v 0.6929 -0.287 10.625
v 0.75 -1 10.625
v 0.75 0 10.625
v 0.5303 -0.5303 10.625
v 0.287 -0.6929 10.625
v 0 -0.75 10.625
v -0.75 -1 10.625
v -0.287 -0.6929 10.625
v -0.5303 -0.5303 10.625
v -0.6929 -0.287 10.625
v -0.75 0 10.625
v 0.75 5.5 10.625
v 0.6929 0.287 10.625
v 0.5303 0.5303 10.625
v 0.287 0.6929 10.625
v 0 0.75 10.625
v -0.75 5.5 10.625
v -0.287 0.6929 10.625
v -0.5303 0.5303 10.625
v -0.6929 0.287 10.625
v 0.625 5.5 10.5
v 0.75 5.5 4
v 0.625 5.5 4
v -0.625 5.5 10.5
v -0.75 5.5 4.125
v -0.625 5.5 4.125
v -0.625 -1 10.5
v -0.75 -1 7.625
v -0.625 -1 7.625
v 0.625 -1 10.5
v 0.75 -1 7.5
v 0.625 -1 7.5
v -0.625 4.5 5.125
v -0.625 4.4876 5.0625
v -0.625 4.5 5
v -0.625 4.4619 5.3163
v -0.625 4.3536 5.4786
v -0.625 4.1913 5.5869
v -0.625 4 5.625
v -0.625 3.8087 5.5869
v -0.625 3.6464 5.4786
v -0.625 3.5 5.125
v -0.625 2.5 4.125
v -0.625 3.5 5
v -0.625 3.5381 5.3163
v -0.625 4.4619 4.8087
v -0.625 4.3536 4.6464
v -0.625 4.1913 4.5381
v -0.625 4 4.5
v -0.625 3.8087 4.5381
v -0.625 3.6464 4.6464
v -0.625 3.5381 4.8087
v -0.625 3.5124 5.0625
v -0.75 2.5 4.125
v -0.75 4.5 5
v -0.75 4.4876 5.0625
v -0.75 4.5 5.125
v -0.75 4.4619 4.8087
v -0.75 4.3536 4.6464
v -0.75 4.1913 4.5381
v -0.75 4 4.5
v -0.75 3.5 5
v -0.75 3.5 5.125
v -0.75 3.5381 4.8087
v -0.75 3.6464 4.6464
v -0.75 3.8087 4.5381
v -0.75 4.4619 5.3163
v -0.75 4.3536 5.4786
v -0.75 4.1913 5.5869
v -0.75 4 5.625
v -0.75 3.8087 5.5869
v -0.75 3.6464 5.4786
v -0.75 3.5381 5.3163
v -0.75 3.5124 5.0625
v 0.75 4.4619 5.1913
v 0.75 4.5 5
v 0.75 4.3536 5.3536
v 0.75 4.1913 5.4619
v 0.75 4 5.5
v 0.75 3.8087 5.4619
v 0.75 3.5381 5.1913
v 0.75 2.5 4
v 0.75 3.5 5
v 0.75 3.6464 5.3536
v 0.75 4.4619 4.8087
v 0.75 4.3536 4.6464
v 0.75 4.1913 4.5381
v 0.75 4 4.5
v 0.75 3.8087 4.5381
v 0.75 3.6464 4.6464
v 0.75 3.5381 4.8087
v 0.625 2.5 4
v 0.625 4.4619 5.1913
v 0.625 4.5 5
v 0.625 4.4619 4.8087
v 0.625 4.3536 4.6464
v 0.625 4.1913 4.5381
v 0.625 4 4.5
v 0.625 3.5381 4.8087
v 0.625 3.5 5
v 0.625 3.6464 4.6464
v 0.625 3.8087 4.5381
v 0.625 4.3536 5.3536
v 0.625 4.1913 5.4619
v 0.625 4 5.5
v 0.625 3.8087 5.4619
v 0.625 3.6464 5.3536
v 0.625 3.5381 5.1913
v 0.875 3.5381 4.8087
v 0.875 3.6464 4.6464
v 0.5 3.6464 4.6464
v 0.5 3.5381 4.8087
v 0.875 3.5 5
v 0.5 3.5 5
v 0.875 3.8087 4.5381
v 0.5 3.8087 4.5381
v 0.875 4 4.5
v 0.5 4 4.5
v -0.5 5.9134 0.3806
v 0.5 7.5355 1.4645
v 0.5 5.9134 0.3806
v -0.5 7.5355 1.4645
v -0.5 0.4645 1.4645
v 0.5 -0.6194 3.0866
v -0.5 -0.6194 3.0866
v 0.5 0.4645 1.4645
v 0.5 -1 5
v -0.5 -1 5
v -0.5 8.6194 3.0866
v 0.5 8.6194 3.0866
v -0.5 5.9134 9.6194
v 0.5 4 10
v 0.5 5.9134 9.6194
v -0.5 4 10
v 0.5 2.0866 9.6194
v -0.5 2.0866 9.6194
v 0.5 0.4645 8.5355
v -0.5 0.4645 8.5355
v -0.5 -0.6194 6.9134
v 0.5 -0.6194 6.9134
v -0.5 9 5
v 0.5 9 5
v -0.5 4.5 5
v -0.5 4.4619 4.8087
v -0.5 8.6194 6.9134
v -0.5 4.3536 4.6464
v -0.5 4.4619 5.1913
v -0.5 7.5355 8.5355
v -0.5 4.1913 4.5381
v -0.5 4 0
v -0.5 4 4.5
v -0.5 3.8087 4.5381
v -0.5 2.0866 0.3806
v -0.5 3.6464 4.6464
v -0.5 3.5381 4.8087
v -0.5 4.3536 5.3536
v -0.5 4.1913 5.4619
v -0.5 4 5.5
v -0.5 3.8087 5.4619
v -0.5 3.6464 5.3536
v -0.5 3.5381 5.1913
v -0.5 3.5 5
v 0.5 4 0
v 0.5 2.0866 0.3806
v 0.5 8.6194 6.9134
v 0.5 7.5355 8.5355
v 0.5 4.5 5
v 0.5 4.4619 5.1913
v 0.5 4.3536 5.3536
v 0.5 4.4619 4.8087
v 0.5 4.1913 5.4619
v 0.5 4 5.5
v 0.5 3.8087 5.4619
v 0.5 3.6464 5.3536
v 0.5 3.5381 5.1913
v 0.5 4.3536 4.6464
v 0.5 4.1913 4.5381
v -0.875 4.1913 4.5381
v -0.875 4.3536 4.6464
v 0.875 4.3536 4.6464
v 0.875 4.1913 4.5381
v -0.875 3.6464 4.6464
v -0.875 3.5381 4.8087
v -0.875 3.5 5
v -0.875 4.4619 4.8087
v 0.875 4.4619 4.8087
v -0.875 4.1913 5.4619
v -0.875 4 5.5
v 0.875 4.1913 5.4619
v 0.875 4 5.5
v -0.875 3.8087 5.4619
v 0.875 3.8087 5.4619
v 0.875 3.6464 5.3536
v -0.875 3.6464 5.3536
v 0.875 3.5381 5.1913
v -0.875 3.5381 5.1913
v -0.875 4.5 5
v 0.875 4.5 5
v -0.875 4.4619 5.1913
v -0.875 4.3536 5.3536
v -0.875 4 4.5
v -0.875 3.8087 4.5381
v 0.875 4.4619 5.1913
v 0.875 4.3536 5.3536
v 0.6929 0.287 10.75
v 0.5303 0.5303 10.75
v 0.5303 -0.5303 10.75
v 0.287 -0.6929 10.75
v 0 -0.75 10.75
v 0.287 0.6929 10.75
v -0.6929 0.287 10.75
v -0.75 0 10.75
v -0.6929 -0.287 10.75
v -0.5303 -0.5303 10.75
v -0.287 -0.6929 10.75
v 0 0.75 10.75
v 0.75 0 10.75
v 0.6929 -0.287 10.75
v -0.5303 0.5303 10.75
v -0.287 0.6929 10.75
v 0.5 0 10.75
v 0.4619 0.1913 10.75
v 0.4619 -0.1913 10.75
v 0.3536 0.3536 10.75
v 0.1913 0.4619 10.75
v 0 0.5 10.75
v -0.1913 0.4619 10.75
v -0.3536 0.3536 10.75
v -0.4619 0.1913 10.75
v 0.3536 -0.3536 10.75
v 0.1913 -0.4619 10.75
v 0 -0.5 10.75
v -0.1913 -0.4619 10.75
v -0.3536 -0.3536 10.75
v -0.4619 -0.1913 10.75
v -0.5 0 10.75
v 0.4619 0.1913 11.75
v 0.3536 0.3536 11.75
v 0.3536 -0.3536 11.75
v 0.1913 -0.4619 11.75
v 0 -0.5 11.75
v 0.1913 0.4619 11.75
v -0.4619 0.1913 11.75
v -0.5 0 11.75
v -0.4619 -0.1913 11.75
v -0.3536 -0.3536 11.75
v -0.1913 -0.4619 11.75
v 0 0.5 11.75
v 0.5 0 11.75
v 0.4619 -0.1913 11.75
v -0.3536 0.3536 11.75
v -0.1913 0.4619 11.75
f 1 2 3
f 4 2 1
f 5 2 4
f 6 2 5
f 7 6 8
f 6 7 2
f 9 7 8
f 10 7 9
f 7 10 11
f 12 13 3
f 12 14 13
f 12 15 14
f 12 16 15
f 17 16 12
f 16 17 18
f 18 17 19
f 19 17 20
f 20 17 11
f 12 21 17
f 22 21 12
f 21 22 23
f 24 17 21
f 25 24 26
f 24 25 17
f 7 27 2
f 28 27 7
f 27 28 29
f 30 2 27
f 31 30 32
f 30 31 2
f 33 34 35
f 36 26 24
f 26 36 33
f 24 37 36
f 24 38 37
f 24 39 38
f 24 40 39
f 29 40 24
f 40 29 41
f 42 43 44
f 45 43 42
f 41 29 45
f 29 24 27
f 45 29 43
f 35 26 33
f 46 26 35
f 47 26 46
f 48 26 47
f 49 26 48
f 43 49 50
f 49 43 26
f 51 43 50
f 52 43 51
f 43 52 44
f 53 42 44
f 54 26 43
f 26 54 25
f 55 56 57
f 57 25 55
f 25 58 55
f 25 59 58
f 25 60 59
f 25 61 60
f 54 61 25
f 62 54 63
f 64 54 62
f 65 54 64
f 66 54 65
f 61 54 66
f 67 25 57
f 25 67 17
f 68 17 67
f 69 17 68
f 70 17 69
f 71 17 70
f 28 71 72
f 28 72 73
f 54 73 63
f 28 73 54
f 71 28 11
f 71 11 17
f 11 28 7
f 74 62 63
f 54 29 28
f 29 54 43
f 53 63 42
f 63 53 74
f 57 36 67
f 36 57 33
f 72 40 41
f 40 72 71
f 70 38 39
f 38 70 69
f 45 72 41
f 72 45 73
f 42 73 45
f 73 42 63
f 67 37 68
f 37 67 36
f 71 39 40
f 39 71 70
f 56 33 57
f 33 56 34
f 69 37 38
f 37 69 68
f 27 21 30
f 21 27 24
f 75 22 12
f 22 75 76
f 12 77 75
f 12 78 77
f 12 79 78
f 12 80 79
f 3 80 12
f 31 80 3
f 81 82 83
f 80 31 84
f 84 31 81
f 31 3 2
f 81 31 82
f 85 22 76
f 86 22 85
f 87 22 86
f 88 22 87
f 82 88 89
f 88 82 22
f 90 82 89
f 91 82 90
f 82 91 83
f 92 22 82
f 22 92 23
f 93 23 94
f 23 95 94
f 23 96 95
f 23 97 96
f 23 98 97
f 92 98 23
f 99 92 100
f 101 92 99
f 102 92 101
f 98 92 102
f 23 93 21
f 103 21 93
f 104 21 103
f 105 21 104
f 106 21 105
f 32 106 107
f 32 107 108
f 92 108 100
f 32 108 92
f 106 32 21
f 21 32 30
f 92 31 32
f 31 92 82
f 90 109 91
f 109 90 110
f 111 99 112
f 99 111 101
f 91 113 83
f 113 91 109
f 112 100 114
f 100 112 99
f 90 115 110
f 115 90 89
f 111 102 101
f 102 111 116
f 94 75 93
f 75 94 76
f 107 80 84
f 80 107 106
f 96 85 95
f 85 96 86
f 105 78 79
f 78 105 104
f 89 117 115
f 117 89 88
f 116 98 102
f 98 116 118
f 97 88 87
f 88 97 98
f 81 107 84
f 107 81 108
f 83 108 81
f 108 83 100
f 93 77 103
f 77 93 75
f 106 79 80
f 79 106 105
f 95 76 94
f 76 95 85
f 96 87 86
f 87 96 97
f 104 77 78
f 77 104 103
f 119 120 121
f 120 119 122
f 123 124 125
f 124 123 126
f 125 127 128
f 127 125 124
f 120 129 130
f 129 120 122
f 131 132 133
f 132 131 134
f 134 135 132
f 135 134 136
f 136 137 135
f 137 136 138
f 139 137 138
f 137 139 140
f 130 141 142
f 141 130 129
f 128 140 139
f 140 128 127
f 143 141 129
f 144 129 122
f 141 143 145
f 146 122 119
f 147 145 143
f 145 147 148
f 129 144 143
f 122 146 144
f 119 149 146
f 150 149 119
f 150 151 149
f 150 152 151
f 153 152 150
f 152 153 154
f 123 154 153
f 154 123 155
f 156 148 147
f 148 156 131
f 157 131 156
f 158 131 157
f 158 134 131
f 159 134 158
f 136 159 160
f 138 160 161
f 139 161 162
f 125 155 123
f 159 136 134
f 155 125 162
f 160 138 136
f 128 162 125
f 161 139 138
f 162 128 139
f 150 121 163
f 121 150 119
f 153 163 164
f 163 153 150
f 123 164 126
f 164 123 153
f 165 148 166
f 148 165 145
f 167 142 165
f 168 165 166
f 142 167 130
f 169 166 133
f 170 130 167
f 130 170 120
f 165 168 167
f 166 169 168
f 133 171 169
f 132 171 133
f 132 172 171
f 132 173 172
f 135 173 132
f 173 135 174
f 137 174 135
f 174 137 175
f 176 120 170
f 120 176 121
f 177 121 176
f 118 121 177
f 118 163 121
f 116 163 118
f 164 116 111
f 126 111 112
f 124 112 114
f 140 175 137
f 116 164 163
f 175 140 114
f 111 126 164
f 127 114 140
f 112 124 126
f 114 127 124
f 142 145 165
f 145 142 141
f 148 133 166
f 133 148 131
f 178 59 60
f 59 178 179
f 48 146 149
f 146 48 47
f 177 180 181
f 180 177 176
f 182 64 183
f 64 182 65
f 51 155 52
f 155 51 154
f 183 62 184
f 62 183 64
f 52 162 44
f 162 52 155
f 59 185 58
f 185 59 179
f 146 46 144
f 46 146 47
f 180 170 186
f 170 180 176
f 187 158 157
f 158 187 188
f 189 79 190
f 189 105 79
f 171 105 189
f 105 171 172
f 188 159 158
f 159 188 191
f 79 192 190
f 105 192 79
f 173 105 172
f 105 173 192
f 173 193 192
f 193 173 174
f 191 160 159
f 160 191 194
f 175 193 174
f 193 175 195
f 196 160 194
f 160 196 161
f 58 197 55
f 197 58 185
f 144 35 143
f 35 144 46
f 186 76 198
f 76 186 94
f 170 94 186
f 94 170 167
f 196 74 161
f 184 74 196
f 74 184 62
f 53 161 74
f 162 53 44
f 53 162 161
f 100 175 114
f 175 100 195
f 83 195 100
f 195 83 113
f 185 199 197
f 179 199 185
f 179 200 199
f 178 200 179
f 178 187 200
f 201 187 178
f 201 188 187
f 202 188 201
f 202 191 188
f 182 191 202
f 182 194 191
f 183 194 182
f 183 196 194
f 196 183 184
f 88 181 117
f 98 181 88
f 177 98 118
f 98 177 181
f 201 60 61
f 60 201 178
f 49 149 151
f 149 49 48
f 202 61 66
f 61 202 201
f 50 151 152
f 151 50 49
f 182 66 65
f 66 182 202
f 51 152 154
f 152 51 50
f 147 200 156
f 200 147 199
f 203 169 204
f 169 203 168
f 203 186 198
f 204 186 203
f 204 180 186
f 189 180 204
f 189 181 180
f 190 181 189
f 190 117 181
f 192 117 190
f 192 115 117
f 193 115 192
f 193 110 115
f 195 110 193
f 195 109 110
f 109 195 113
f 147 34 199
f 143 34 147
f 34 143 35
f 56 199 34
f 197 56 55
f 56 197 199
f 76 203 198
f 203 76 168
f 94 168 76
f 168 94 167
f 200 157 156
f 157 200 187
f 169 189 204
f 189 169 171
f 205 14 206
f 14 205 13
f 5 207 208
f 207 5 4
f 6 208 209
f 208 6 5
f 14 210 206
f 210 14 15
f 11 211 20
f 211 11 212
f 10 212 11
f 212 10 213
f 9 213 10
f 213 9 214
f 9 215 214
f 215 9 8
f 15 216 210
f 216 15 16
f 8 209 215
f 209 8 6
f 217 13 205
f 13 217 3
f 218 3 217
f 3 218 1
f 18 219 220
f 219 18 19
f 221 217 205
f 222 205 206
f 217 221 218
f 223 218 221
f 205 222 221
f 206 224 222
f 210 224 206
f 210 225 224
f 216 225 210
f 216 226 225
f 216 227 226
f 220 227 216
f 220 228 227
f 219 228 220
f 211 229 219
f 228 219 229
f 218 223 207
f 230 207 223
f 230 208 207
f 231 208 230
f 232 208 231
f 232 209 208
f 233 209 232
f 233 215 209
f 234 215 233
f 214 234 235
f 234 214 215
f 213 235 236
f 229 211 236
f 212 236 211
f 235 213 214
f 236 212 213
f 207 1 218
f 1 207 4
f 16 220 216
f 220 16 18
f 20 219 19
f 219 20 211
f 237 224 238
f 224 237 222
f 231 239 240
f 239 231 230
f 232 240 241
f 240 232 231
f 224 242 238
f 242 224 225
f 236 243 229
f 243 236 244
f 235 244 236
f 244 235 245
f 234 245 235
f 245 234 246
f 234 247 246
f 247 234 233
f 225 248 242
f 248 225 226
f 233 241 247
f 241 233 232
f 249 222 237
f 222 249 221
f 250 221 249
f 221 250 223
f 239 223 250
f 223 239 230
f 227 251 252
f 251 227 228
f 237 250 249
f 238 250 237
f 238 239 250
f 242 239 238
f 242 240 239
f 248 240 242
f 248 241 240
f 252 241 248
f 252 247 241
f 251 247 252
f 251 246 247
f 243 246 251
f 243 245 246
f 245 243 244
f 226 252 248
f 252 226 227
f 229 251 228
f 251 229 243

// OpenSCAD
function caster_axel(wheel_r, axel_r) = [1 + axel_r, wheel_r + axel_r, 0];

module caster_bracket(wheel_r, wheel_h, axel_r, plate_t, padding=0.125, $fn=$fn) {
    plate_side = wheel_r + axel_r + 1;
    
    module caster_plate(
        wheel_r,
        axel_r,
        plate_t,
    ) {
        difference() {
            linear_extrude(plate_t)
            polygon([
                [0, 0],
                [0, plate_side],
                [2 + axel_r * 2, plate_side],
                [plate_side, 2 + axel_r * 2],
                [plate_side, 0],
            ]);
            
            axel = caster_axel(wheel_r, axel_r);
            translate(axel)
            cylinder(r=axel_r, h=plate_t, $fn=$fn);
        }
    }

    translate([0, -plate_t, 0])
    union() {
        translate([0, plate_t, 0]);
        caster_plate(wheel_r, axel_r, plate_t);

        translate([0, plate_t, wheel_h + (plate_t + padding * 2)])
        caster_plate(wheel_r, axel_r, plate_t);
        
        cube([plate_side, plate_t, wheel_h + ((plate_t + padding) * 2)]);
    }
}

module caster(
    wheel_r,
    wheel_h,
    axel_r,
    axel_h,
    bearing_r=0,
    bearing_h=0,
    plate_t=0.125,
    padding=0.125,
    $fn=$fn,
) {
    rotate([-90, 0, -90])
    translate([-(caster_axel(wheel_r, axel_r).y), bearing_h - (wheel_r * 2) - 1 + plate_t + padding, -((wheel_h/2) + plate_t + padding)])
    union() {
        caster_bracket(wheel_r, wheel_h, axel_r, plate_t, padding, $fn=$fn);
        
        translate(caster_axel(wheel_r, axel_r)) {
            translate([0, 0, plate_t + padding])
            cylinder(r = wheel_r, h=wheel_h, $fn=$fn);
            
            translate([0, 0, -padding]) {
                cylinder(r = axel_r, h = (wheel_h + (2* plate_t) + (padding*4)), $fn=$fn);
            }
        }
        
        translate([caster_axel(wheel_r, axel_r).y, 0, (wheel_h/2) + plate_t + padding])
        rotate([90, 0, 0]) {
            cylinder(r = bearing_r, h=bearing_h);
            
            translate([0, 0, bearing_h])
            cylinder(r=axel_r, h=axel_h, $fn=$fn);
        }
    }
}

caster(
    // wheel (r, h)
    5, 1, 
    // axel (r, h)
    0.5, 1,
    // bearing (r, h)
    0.75, 0.25,
    $fn=16
);
